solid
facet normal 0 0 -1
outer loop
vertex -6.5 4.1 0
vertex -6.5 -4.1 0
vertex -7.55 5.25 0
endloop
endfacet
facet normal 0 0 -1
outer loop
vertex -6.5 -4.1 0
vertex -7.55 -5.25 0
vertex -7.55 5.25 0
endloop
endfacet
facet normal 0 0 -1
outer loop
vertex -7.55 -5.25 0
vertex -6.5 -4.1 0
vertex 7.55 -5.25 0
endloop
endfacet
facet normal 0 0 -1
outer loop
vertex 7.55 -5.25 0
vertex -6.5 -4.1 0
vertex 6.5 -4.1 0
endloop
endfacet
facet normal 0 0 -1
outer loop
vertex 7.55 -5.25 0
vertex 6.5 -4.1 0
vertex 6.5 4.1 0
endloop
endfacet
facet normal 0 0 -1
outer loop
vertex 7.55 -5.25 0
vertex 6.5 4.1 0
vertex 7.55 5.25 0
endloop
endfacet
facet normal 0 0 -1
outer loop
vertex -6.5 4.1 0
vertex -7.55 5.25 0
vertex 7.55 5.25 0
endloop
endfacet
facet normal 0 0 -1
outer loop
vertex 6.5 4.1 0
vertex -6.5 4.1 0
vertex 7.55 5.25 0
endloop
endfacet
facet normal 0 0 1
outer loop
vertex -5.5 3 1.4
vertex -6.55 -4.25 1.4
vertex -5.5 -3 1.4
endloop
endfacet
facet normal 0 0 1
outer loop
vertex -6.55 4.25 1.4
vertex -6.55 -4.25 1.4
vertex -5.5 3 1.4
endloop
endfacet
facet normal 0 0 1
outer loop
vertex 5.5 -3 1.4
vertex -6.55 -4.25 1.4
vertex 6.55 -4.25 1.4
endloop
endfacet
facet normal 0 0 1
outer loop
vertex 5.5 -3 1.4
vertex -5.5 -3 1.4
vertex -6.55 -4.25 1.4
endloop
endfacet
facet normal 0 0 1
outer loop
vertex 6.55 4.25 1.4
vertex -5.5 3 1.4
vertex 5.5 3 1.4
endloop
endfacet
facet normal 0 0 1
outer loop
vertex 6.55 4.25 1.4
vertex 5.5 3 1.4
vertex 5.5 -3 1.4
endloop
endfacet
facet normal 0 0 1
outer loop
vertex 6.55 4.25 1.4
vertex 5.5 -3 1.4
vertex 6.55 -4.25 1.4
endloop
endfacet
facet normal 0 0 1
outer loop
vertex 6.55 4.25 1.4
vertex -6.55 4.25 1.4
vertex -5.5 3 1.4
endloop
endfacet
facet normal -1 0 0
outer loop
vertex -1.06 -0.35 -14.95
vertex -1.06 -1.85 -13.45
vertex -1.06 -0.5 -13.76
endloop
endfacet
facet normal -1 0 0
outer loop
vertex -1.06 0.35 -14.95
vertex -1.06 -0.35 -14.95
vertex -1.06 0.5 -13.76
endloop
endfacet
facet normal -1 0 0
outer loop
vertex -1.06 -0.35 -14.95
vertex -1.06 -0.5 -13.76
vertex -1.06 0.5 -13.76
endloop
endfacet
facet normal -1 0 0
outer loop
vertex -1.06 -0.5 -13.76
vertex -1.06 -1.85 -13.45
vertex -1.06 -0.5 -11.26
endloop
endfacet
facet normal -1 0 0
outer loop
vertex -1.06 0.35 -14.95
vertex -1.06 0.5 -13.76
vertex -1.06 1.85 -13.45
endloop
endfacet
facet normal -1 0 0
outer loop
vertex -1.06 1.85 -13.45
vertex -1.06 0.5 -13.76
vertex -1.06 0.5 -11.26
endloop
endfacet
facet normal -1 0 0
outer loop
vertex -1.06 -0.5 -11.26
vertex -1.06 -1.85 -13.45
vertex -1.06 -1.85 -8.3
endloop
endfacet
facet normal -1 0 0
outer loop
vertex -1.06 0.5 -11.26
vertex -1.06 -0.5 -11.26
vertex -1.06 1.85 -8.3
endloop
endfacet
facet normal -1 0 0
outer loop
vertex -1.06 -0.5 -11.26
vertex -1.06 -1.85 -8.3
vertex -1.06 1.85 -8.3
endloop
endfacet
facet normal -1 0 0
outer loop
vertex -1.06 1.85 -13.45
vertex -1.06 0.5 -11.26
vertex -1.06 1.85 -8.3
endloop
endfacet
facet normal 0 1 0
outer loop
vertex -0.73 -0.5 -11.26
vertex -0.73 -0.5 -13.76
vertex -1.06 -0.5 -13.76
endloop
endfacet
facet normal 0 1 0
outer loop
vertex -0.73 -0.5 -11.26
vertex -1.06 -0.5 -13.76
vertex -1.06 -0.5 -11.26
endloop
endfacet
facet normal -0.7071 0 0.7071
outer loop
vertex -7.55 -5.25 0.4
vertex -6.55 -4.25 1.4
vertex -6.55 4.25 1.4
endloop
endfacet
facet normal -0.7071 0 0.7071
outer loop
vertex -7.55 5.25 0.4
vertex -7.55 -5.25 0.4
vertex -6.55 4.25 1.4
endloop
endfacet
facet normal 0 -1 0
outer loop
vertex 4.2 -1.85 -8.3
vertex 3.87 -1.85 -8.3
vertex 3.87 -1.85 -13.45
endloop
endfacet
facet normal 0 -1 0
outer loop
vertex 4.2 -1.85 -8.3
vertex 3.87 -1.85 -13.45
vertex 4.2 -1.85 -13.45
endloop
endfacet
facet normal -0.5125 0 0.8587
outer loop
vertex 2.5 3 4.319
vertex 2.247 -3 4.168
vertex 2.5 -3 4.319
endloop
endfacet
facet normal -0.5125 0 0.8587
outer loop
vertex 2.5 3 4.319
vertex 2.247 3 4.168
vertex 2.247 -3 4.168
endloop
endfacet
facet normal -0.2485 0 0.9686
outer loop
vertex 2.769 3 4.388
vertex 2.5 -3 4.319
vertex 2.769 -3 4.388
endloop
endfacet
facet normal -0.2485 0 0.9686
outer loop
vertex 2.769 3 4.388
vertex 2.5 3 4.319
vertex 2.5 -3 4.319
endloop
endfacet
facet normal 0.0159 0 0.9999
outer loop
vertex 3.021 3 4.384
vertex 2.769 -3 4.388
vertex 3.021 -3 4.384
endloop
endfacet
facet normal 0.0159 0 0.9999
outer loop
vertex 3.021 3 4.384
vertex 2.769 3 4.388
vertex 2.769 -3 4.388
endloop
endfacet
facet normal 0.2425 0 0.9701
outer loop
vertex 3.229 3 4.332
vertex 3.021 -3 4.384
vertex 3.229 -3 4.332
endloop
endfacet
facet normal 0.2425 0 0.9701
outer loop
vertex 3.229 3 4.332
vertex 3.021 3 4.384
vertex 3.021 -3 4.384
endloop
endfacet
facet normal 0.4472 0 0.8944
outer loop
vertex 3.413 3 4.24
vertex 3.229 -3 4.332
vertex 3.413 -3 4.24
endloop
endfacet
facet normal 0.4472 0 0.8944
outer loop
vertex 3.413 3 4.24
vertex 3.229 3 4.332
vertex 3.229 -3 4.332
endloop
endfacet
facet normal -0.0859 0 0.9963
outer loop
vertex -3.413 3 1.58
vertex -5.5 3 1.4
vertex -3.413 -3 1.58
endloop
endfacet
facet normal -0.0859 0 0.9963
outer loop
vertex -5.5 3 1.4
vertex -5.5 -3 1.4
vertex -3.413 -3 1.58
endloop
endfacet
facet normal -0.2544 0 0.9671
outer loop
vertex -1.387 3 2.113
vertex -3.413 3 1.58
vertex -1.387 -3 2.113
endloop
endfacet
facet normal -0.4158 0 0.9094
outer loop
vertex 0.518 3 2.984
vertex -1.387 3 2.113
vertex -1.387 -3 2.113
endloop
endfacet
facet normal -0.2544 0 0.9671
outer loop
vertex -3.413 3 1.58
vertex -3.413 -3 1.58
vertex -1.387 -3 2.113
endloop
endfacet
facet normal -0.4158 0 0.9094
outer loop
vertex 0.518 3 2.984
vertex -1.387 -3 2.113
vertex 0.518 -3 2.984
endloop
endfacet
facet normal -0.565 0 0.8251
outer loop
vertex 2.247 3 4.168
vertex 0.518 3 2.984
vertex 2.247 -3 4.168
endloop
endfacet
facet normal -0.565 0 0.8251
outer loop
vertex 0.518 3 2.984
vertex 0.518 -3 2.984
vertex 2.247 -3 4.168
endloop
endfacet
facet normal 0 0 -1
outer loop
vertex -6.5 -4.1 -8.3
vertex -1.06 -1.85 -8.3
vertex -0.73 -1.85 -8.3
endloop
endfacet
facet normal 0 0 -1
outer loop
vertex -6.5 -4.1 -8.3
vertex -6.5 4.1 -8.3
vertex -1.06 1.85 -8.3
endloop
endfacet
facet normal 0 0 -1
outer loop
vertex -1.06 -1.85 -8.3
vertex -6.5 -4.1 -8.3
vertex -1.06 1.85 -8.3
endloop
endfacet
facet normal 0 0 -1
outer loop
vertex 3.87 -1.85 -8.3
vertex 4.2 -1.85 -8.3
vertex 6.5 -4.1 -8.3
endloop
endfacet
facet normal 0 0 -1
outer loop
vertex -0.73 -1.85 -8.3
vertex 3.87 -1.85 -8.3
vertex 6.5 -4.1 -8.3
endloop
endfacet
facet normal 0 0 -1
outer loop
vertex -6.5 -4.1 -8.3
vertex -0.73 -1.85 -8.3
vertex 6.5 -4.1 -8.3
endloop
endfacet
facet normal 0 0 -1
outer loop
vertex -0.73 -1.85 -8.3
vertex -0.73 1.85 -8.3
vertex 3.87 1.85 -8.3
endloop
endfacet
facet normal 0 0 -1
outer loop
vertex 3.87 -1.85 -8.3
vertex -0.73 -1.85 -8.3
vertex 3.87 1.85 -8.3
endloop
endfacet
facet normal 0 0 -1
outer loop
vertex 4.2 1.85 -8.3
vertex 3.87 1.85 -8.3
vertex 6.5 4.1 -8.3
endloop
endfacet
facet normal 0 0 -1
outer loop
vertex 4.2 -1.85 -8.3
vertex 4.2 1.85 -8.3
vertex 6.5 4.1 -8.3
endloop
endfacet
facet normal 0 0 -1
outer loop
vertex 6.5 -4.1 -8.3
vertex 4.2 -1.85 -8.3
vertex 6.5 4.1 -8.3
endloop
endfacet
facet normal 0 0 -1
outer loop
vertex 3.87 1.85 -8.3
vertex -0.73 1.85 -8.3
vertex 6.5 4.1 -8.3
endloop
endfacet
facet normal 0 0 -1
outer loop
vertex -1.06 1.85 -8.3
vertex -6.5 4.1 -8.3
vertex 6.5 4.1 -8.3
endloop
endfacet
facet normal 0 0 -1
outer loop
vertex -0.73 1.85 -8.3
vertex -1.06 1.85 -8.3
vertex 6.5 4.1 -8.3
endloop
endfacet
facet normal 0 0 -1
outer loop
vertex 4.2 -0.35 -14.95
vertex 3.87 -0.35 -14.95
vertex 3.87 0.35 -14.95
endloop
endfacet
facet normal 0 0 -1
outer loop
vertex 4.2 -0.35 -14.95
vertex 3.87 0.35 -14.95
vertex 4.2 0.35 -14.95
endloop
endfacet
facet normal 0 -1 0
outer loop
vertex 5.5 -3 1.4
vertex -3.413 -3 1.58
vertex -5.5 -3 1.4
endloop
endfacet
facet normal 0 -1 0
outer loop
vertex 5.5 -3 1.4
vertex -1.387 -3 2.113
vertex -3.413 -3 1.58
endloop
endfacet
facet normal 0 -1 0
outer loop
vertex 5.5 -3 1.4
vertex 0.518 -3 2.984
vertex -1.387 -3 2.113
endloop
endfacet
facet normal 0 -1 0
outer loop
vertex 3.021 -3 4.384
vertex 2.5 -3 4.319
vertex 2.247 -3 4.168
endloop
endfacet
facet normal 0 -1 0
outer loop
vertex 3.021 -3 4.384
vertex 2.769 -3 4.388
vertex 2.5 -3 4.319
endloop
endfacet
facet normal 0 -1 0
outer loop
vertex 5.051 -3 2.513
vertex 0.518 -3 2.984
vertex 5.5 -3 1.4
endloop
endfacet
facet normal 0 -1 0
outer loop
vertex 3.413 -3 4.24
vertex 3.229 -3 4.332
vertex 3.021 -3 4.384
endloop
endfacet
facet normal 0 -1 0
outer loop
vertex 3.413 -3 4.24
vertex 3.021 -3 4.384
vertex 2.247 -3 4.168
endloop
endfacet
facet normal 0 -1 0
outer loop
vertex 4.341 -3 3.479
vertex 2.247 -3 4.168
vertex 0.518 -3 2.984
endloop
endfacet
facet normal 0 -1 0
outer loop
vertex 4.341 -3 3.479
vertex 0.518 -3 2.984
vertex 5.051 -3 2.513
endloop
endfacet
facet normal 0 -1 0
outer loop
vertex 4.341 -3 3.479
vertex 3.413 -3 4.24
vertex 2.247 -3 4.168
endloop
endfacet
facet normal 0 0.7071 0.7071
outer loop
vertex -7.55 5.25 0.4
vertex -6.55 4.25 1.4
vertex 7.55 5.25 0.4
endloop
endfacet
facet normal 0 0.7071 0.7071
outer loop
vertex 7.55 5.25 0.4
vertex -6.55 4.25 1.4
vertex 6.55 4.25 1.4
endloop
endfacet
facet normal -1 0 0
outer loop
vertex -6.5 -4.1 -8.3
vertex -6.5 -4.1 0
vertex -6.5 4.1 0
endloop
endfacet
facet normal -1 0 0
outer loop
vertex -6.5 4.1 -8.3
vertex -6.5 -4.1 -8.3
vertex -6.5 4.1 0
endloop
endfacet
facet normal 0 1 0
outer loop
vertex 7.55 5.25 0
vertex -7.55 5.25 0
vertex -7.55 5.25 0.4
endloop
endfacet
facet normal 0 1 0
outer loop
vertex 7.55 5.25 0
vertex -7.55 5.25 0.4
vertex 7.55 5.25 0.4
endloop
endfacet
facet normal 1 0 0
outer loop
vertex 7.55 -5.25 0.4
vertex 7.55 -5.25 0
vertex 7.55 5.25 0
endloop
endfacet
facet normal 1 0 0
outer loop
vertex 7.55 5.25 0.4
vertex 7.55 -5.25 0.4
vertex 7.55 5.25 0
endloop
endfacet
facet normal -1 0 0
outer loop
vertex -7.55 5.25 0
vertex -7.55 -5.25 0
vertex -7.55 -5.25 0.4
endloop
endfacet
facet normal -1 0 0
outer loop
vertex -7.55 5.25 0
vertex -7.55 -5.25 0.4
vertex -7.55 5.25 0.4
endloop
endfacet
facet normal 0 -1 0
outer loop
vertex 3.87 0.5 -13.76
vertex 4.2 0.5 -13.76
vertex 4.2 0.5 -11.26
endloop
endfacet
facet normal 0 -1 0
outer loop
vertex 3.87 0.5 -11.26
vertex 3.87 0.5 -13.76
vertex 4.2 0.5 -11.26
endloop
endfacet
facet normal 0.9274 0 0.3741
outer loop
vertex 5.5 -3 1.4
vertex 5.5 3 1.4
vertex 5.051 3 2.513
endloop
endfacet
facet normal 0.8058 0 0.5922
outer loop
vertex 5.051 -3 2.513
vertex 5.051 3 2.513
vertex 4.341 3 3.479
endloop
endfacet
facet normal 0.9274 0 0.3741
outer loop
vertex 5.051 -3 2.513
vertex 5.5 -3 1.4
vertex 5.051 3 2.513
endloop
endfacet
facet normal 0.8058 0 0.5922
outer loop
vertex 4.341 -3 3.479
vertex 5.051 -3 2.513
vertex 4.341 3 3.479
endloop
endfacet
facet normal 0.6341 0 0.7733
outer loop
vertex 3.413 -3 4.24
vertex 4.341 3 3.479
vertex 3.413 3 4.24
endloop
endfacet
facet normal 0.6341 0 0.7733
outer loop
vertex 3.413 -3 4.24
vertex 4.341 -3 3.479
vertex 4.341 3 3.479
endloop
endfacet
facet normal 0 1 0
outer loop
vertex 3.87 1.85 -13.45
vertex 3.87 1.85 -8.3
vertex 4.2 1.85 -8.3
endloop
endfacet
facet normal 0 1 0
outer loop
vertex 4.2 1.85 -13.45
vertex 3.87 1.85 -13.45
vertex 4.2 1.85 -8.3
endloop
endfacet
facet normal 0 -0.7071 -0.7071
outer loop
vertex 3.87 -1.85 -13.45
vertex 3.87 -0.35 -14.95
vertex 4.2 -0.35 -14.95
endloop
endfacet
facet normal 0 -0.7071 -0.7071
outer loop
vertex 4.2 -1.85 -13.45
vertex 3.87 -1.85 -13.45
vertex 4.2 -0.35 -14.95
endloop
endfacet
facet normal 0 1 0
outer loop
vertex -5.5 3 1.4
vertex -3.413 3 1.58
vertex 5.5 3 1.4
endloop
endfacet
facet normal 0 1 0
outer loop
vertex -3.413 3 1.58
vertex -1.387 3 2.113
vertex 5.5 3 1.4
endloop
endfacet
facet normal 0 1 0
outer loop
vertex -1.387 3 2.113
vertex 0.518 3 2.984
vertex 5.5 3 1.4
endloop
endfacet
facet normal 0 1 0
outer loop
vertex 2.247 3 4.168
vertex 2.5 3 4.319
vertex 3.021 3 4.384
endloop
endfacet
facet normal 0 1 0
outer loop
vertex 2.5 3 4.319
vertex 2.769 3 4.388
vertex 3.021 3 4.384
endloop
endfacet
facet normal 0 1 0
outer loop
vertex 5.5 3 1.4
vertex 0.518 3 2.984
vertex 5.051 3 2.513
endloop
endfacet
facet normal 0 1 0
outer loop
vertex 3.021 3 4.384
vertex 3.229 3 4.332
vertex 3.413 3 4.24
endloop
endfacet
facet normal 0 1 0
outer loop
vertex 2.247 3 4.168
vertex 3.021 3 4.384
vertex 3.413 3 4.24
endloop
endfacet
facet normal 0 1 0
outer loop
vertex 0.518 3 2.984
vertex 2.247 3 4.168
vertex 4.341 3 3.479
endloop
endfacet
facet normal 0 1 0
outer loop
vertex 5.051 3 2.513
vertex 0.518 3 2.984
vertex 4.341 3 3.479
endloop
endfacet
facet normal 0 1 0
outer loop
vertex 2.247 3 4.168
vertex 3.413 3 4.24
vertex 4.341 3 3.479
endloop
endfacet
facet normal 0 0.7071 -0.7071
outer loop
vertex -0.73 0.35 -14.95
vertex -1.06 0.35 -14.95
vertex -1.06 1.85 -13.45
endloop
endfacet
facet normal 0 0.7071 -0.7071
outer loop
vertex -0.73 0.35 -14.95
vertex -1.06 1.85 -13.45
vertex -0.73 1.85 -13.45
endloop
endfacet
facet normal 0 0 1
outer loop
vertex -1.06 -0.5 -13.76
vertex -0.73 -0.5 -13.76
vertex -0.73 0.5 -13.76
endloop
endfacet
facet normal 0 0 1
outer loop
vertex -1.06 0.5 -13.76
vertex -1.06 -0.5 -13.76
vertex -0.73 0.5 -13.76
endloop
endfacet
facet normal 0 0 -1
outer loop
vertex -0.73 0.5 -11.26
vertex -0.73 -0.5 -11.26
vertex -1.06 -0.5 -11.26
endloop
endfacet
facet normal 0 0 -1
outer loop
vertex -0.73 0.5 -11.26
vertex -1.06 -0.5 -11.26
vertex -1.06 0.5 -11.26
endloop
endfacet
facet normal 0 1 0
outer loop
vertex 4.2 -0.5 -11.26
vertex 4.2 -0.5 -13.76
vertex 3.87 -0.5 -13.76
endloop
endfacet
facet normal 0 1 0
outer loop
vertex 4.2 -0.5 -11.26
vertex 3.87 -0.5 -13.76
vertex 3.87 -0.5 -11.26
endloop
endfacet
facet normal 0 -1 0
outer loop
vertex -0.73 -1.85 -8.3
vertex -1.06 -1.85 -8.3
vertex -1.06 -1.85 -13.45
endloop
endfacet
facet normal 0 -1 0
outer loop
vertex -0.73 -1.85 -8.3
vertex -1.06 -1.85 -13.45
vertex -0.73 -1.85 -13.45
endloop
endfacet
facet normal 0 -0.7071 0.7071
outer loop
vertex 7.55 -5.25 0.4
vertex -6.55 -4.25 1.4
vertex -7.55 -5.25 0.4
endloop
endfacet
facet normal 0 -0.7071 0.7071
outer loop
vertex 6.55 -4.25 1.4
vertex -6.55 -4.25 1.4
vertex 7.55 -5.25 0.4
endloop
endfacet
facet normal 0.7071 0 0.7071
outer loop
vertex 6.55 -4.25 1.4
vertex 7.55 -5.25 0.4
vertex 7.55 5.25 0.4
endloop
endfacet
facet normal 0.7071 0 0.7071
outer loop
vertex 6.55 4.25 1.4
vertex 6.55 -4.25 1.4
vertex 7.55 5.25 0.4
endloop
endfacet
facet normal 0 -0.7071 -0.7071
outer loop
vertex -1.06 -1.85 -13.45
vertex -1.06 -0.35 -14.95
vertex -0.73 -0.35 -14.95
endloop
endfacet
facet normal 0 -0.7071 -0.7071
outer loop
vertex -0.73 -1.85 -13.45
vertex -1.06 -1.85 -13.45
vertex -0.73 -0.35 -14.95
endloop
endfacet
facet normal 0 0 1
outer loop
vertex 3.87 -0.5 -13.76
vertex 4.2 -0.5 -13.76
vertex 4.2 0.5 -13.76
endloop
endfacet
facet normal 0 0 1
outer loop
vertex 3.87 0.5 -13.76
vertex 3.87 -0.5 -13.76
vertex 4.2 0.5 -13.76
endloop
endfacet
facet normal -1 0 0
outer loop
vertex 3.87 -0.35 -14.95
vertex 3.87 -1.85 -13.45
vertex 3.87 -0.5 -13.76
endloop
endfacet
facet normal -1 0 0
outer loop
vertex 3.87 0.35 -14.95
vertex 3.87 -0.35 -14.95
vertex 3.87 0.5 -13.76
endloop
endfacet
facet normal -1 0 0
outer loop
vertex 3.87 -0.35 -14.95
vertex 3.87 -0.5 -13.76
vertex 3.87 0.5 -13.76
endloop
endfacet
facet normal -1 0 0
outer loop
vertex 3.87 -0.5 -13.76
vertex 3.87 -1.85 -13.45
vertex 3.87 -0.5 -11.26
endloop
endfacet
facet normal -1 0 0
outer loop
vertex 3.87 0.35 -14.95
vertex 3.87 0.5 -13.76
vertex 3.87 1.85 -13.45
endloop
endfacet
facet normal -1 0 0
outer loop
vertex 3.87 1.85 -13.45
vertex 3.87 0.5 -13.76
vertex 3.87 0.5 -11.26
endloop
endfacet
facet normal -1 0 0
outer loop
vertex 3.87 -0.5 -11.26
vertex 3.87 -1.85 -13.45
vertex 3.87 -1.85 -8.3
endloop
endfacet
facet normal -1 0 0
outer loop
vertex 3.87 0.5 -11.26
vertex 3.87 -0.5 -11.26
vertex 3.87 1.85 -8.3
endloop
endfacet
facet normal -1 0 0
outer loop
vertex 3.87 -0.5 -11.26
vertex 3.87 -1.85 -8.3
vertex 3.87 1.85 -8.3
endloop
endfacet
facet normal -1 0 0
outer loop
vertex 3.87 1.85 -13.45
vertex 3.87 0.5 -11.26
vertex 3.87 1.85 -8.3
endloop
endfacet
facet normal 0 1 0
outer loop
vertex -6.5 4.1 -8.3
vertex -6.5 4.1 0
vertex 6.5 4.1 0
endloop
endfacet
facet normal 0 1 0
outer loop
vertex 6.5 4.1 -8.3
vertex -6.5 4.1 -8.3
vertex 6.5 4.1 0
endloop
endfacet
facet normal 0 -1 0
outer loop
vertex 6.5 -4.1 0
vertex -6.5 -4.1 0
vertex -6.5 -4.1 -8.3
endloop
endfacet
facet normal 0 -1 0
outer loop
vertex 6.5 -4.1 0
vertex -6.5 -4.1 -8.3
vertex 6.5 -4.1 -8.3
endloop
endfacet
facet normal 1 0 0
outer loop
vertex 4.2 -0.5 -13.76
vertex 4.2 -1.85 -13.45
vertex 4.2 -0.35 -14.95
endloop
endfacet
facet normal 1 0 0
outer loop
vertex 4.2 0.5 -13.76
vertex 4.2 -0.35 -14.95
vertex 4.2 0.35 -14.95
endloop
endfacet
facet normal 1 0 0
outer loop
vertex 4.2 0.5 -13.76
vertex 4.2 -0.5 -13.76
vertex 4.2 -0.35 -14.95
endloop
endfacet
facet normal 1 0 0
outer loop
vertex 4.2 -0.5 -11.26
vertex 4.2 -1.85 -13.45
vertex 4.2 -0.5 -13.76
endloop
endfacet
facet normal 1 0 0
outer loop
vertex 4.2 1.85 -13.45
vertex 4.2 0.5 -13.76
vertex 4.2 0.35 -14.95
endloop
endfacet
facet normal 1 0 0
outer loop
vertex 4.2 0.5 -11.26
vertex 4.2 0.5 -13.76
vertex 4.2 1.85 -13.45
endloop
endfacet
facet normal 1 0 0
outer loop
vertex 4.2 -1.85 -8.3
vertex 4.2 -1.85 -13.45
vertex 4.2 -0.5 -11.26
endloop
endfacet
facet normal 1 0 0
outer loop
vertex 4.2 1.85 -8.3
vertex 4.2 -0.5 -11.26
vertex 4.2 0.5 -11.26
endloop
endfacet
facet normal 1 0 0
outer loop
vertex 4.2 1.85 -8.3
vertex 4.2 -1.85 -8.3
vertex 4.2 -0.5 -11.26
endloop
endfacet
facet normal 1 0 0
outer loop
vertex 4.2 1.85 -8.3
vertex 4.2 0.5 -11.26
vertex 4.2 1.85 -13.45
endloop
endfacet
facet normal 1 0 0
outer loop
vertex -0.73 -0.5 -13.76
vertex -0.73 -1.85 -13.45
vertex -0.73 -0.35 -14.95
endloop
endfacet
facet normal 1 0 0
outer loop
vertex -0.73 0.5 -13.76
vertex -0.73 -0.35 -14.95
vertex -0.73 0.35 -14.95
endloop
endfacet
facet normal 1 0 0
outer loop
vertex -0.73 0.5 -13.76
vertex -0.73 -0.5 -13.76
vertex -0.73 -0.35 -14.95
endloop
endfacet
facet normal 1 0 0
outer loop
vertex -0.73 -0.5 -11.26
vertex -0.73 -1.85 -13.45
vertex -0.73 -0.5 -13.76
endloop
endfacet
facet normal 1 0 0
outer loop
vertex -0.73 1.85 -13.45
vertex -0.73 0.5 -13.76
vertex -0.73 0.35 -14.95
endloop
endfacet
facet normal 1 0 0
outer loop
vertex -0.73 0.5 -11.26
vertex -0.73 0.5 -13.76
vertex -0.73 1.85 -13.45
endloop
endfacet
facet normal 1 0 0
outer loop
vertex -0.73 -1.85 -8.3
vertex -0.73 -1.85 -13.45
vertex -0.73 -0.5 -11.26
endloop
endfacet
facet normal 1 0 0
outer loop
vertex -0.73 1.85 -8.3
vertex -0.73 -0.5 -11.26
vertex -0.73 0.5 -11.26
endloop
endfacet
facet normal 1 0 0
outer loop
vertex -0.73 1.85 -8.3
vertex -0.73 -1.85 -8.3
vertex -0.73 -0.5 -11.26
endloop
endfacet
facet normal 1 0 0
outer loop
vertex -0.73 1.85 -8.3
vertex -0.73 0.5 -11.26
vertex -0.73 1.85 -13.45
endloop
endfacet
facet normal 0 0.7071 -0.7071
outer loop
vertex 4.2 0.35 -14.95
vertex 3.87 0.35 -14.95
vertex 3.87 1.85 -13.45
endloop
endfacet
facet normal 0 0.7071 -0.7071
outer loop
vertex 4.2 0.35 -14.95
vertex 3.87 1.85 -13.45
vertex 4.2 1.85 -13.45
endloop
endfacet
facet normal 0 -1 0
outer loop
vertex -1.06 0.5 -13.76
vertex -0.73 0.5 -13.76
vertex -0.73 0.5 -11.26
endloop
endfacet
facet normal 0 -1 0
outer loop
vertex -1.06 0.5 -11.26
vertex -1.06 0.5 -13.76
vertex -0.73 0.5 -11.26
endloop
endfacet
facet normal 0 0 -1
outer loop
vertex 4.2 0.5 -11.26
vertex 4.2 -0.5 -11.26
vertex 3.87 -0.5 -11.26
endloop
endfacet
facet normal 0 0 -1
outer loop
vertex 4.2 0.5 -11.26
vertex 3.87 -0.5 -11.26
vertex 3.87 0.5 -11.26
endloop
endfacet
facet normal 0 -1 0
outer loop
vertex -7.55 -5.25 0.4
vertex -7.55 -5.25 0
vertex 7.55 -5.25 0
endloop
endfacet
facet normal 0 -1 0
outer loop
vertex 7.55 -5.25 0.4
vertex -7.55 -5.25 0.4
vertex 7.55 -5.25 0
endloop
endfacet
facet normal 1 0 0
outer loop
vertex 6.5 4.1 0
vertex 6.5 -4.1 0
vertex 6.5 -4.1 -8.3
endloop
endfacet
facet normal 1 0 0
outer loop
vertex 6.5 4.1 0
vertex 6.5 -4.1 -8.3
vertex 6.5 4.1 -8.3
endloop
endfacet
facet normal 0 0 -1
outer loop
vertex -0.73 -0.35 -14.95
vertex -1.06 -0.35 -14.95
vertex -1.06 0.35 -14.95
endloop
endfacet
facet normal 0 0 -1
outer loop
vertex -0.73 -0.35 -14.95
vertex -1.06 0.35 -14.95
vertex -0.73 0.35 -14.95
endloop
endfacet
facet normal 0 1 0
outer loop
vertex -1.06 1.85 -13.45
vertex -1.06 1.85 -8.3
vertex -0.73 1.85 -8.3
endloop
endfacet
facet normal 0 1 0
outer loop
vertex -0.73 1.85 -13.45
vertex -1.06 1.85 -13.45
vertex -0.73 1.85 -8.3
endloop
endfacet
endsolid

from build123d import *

# Parameters (mm, degrees)
SKETCH_W        = 13
SKETCH_H        = 8.2
PAD_DEPTH       = 8.3
SKETCH001_W     = 15.1
SKETCH001_H     = 10.5
PAD001_DEPTH    = 1.4
CHAMFER_SIZE    = 1
PAD002_DEPTH    = 3
FILLET_R        = 1
SKETCH003_W     = 0.33
SKETCH003_H     = 3.7
PAD003_DEPTH    = 6.65
CHAMFER001_SIZE = 1.5
SKETCH004_W     = 1
SKETCH004_H     = 2.5
POCKET_DEPTH    = 11.751


with BuildPart() as part:
    # Sketch → Pad (new body)
    with BuildSketch(Plane.XY):
        Rectangle(SKETCH_W, SKETCH_H)
    extrude(amount=-PAD_DEPTH)

    # Sketch001 → Pad001 (join)
    with BuildSketch(Plane.XY):
        Rectangle(SKETCH001_W, SKETCH001_H)
    extrude(amount=PAD001_DEPTH)

    # Chamfer
    chamfer_edges = [part.edges().sort_by_distance(p)[0] for p in [
        (-7.55, 0, 1.4),
        (0, 5.25, 1.4),
        (7.55, 0, 1.4),
        (0, -5.25, 1.4),
    ]]
    chamfer(chamfer_edges, length=CHAMFER_SIZE)

    # Sketch002 → Pad002 (join, symmetric)
    with BuildSketch(Plane.XZ):
        with BuildLine():
            Line((-5.5, 1.4), (5.5, 1.4))
            ThreePointArc((5.5, 1.4), (4.48879, 3.316002), (2.739315, 4.593869))
            ThreePointArc((-5.5, 1.4), (-1.081654, 2.2264), (2.739315, 4.593869))
        make_face()
    extrude(amount=PAD002_DEPTH, both=True)

    # Fillet
    fillet_edges = [part.edges().sort_by_distance(p)[0] for p in [
        (2.739315, 0, 4.593869),
    ]]
    fillet(fillet_edges, radius=FILLET_R)

    # Sketch003 (on DatumPlane) → Pad003 (join)
    with BuildSketch(Plane.XY.offset(-8.3)):
        with Locations((4.035, 0)):
            Rectangle(SKETCH003_W, SKETCH003_H)
        with Locations((-0.895, 0)):
            Rectangle(SKETCH003_W, SKETCH003_H)
    extrude(amount=-PAD003_DEPTH)

    # Chamfer001
    chamfer001_edges = [part.edges().sort_by_distance(p)[0] for p in [
        (4.035, -1.85, -14.95),
        (4.035, 1.85, -14.95),
        (-0.895, 1.85, -14.95),
        (-0.895, -1.85, -14.95),
    ]]
    chamfer(chamfer001_edges, length=CHAMFER001_SIZE)

    # Sketch004 (on Face5 of Chamfer001) → Pocket (cut, through all)
    with BuildSketch(Plane.YZ.offset(4.2)):
        with Locations((0, -12.51)):
            Rectangle(SKETCH004_W, SKETCH004_H)
    extrude(amount=-POCKET_DEPTH, mode=Mode.SUBTRACT)


solid = part.part
